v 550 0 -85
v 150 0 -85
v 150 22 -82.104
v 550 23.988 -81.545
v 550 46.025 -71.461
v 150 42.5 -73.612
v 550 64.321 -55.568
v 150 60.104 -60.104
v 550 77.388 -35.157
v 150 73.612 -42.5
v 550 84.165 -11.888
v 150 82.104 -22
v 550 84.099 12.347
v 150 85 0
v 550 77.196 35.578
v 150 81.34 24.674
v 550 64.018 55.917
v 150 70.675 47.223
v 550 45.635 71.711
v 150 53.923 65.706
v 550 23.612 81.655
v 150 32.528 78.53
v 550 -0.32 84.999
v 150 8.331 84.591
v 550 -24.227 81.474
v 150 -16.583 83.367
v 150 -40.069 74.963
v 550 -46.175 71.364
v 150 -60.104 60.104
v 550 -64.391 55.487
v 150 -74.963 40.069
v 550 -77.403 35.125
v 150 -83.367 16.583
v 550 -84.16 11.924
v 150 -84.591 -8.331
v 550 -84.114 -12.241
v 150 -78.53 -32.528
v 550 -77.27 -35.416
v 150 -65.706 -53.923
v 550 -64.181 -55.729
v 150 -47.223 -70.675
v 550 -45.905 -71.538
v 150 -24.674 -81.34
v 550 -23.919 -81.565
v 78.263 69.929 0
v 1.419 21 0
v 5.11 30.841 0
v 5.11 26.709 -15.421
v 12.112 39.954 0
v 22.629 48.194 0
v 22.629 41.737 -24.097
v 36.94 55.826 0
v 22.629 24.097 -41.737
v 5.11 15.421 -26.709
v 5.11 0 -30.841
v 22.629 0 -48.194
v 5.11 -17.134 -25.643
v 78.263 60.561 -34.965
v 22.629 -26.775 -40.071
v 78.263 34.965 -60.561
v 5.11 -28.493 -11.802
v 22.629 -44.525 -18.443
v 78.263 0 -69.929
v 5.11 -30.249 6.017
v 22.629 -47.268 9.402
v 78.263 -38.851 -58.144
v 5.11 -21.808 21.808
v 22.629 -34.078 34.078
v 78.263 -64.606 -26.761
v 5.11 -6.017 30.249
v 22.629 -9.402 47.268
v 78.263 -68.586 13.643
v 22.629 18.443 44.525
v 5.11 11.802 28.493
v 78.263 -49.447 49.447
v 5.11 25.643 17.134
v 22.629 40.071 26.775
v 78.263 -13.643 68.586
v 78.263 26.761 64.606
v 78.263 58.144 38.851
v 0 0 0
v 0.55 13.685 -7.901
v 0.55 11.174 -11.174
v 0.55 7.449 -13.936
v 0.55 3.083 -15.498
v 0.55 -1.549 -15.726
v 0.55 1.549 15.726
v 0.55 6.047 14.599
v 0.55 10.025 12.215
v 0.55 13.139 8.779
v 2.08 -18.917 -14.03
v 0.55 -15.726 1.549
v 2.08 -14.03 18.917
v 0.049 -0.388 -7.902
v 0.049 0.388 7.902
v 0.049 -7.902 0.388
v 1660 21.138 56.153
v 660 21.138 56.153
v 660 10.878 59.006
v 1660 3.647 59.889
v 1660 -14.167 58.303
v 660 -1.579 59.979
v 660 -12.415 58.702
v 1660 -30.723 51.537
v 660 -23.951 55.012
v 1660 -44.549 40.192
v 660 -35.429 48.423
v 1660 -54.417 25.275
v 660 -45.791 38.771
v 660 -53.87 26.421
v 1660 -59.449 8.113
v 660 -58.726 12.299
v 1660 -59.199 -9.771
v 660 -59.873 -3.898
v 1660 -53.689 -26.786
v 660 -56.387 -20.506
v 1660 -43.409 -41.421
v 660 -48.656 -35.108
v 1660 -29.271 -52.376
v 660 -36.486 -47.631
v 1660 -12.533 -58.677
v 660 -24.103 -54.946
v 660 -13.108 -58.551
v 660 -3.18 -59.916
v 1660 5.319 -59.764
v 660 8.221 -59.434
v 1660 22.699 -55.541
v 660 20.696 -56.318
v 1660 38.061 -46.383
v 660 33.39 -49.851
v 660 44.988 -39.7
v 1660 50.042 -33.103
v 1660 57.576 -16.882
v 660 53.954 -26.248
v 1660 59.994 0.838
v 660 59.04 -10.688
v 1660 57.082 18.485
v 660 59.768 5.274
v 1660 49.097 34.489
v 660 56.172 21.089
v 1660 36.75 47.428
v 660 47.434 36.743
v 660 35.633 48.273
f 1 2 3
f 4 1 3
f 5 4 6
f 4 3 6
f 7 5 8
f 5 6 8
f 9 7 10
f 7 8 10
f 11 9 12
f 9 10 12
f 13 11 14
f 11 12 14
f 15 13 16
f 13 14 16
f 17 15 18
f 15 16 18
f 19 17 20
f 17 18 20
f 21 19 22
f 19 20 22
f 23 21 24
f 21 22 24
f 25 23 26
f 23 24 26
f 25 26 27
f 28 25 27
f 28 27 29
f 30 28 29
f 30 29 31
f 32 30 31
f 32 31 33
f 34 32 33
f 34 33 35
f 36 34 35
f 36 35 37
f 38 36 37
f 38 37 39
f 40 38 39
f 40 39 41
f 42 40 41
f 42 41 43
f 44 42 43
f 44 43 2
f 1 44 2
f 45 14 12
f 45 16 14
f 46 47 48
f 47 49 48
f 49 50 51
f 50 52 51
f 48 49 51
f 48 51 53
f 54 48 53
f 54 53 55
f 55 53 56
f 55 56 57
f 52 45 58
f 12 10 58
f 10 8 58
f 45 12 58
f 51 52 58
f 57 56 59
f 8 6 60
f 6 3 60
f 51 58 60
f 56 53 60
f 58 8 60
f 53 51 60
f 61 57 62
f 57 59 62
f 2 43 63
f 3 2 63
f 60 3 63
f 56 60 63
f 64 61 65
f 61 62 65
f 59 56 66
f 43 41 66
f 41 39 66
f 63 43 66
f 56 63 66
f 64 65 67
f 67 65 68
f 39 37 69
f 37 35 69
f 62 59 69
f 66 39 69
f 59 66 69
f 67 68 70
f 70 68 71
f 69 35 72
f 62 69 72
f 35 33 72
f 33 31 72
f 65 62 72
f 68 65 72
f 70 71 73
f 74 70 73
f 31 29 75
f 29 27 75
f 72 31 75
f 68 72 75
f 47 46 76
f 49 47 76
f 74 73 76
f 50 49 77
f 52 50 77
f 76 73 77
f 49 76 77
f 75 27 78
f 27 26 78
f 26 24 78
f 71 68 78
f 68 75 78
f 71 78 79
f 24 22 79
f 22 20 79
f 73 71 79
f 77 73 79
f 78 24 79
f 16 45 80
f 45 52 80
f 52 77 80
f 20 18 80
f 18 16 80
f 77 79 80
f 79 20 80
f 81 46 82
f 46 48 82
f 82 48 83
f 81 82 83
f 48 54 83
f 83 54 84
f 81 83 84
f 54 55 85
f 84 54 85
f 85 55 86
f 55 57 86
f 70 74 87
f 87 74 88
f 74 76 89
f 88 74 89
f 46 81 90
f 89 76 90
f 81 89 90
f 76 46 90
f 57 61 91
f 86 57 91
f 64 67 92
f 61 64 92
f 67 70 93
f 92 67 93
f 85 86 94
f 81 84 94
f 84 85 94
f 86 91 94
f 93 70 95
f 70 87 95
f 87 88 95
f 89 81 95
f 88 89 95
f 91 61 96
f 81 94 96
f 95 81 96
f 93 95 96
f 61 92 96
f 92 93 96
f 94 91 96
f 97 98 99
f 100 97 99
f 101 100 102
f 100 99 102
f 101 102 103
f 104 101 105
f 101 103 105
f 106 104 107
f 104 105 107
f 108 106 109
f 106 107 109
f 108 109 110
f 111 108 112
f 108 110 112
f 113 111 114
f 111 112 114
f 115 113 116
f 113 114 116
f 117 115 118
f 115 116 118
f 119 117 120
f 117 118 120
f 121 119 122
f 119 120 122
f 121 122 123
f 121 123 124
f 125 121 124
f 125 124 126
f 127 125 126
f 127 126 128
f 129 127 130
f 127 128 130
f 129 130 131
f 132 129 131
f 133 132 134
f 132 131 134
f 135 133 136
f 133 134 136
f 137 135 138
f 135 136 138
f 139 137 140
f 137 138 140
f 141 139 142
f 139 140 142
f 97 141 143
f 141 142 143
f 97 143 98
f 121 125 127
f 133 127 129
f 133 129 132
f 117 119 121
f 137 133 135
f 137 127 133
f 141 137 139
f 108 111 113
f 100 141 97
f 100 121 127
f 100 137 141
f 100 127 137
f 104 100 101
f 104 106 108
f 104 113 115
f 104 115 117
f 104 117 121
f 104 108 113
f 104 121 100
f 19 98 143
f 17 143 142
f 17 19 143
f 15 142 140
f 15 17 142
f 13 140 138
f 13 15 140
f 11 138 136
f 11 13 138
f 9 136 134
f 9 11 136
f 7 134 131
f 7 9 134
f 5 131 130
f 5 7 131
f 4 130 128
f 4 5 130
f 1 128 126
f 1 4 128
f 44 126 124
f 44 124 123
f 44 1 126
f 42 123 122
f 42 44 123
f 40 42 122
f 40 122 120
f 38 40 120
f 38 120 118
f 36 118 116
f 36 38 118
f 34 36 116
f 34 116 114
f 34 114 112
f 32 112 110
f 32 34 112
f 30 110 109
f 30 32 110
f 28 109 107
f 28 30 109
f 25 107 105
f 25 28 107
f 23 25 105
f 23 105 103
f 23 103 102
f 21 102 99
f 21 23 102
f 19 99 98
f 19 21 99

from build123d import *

# Parameters (mm, degrees)
SKETCH2_R           = 85
BOSS_EXTRUDE1_DEPTH = 400
SKETCH4_R           = 60
BOSS_EXTRUDE2_DEPTH = 1000


with BuildPart() as part:
    # Sketch1 → Revolve1 (revolve)
    with BuildSketch(Plane.XY):
        with BuildLine():
            Line((150, 85), (150, 0))
            Line((150, 0), (0, 0))
            add(Edge.make_bspline(
                [(0, 0), (-0.012294225, 3.891554312), (-0.027437579, 8.684958126), (0.361573767, 14.085722357), (0.576098453, 16.090496183), (0.782493435, 17.604822189), (0.986227589, 18.854298664), (1.188670863, 19.931536976), (1.390404268, 20.885679324), (1.591698837, 21.746529091), (1.792703864, 22.533746067), (1.993507167, 23.261083862), (2.253808552, 24.139979457), (2.580573656, 25.146175179), (2.983585386, 26.259501153), (3.385879093, 27.271261727), (3.787683439, 28.201566994), (4.189138614, 29.064817448), (4.590335615, 29.871726974), (5.05331092, 30.74778076), (5.583218589, 31.683457084), (6.185429632, 32.669732492), (6.787226927, 33.590624245), (7.451481511, 34.546094958), (8.182770444, 35.530963646), (8.985083876, 36.540013411), (9.850344603, 37.562485558), (10.782608842, 38.595746542), (11.785011743, 39.636928062), (12.851029789, 40.680352273), (13.983960321, 41.72463117), (15.186170623, 42.768194245), (16.387975322, 43.755294725), (17.654380903, 44.743506811), (18.987602276, 45.731471932), (20.389198856, 46.717890971), (21.790522044, 47.657861765), (23.257103599, 48.59836715), (24.790441056, 49.538186318), (26.391587757, 50.476245251), (28.05829275, 51.412163763), (29.791720393, 52.345056651), (31.59268286, 53.274185034), (33.459445798, 54.199628429), (35.392909821, 55.120726442), (37.459746918, 56.067201212), (39.59327023, 57.006562681), (41.860151348, 57.96659169), (44.193707143, 58.917521836), (46.660609333, 59.885320784), (49.260404933, 60.867669295), (51.99403381, 61.861671206), (54.860992187, 62.865616104), (57.794602823, 63.85555089), (60.861539281, 64.853573463), (64.06149587, 65.858380358), (67.461497598, 66.888166734), (70.995135905, 67.920234745), (74.662088876, 68.953918346), (78.462130407, 69.988575944), (82.462197069, 71.040436012), (86.662284614, 72.107100186), (91.062388571, 73.18640193), (95.662505252, 74.276388609), (100.462631288, 75.375305679), (105.462763855, 76.481579791), (110.662900527, 77.593803027), (116.063039296, 78.710717608), (121.663178505, 79.831201671), (127.529872228, 80.967142806), (133.663251007, 82.116215238), (140.063409966, 83.276352633), (145.198462089, 84.177415336), (148.333178957, 84.715838785), (149.39998937, 84.897876633), (149.733326587, 84.954653305), (149.933332963, 84.98866355), (150, 85)],
                knots=[0, 0, 0, 0, 0.061462209, 0.075705788, 0.085548437, 0.093321935, 0.099856333, 0.105553797, 0.110642995, 0.115267654, 0.119524592, 0.123482434, 0.127191759, 0.134010181, 0.140199136, 0.145901384, 0.151215493, 0.156212588, 0.160945789, 0.165455878, 0.171870938, 0.177937368, 0.183716425, 0.189254732, 0.196326298, 0.203099892, 0.209625632, 0.217492532, 0.225090541, 0.232464167, 0.24106462, 0.249438142, 0.257620809, 0.265641058, 0.274822876, 0.28384341, 0.292725747, 0.301488561, 0.311376345, 0.321146599, 0.330814589, 0.341584449, 0.352255608, 0.362840299, 0.374512001, 0.386101174, 0.398765505, 0.411352526, 0.425006218, 0.438588433, 0.453231339, 0.468927603, 0.484557057, 0.501237456, 0.517857889, 0.535527769, 0.554243231, 0.574001115, 0.593705628, 0.614453399, 0.636242373, 0.65907093, 0.682937829, 0.707842151, 0.733783254, 0.760760729, 0.78877436, 0.81782409, 0.847909993, 0.879032247, 0.912262482, 0.946527454, 0.981827786, 0.994656092, 0.99679374, 0.998931275, 1, 1, 1, 1], degree=3))
        make_face()
    revolve(axis=Axis((0, 0, 0), (-1, 0, 0)))

    # Sketch2 → Boss-Extrude1 (add)
    with BuildSketch(Plane(origin=(150, 0, 0), x_dir=(0, 0, -1), z_dir=(1, 0, 0))):
        Circle(SKETCH2_R)
    extrude(amount=BOSS_EXTRUDE1_DEPTH)

    # Loft1: read off the stored shape, not the designer's step
    # Loft1: loft between two sections, ruled curve by curve
    loft1_from = [
        Edge.make_bspline([(660, 21.137943081, 56.153248902), (660, 133.444440886, 13.877362739), (660, 91.168554723, -98.429135065), (660, -21.137943081, -56.153248902), (660, -133.444440886, -13.877362739), (660, -91.168554723, 98.429135065), (660, 21.137943081, 56.153248902)], [0, 0, 0, 0, 0.5, 0.5, 0.5, 1, 1, 1, 1], 3, [1, 0.333333333, 0.333333333, 1, 0.333333333, 0.333333333, 1]),
    ]
    loft1_to = [
        Edge.make_bspline([(550, 45.635427758, 71.710583133), (550, 189.056594025, -19.560272383), (550, 97.785738508, -162.98143865), (550, -45.635427758, -71.710583133), (550, -189.056594025, 19.560272383), (550, -97.785738508, 162.98143865), (550, 45.635427758, 71.710583133)], [0, 0, 0, 0, 0.5, 0.5, 0.5, 1, 1, 1, 1], 3, [1, 0.333333333, 0.333333333, 1, 0.333333333, 0.333333333, 1]),
    ]
    loft1 = Solid(Shell([*[Face.make_surface_from_curves(loft1_from[k], loft1_to[k]) for k in range(1)], Face(Wire(loft1_from)), Face(Wire(loft1_to))]))
    add(loft1)

    # Sketch4 → Boss-Extrude2 (add)
    with BuildSketch(Plane(origin=(660, 0, 0), x_dir=(0, 0, -1), z_dir=(1, 0, 0))):
        with Locations(Location((0, 0, 0), (0, 0, 159.372))):
            Circle(SKETCH4_R)
    extrude(amount=BOSS_EXTRUDE2_DEPTH)


solid = part.part
